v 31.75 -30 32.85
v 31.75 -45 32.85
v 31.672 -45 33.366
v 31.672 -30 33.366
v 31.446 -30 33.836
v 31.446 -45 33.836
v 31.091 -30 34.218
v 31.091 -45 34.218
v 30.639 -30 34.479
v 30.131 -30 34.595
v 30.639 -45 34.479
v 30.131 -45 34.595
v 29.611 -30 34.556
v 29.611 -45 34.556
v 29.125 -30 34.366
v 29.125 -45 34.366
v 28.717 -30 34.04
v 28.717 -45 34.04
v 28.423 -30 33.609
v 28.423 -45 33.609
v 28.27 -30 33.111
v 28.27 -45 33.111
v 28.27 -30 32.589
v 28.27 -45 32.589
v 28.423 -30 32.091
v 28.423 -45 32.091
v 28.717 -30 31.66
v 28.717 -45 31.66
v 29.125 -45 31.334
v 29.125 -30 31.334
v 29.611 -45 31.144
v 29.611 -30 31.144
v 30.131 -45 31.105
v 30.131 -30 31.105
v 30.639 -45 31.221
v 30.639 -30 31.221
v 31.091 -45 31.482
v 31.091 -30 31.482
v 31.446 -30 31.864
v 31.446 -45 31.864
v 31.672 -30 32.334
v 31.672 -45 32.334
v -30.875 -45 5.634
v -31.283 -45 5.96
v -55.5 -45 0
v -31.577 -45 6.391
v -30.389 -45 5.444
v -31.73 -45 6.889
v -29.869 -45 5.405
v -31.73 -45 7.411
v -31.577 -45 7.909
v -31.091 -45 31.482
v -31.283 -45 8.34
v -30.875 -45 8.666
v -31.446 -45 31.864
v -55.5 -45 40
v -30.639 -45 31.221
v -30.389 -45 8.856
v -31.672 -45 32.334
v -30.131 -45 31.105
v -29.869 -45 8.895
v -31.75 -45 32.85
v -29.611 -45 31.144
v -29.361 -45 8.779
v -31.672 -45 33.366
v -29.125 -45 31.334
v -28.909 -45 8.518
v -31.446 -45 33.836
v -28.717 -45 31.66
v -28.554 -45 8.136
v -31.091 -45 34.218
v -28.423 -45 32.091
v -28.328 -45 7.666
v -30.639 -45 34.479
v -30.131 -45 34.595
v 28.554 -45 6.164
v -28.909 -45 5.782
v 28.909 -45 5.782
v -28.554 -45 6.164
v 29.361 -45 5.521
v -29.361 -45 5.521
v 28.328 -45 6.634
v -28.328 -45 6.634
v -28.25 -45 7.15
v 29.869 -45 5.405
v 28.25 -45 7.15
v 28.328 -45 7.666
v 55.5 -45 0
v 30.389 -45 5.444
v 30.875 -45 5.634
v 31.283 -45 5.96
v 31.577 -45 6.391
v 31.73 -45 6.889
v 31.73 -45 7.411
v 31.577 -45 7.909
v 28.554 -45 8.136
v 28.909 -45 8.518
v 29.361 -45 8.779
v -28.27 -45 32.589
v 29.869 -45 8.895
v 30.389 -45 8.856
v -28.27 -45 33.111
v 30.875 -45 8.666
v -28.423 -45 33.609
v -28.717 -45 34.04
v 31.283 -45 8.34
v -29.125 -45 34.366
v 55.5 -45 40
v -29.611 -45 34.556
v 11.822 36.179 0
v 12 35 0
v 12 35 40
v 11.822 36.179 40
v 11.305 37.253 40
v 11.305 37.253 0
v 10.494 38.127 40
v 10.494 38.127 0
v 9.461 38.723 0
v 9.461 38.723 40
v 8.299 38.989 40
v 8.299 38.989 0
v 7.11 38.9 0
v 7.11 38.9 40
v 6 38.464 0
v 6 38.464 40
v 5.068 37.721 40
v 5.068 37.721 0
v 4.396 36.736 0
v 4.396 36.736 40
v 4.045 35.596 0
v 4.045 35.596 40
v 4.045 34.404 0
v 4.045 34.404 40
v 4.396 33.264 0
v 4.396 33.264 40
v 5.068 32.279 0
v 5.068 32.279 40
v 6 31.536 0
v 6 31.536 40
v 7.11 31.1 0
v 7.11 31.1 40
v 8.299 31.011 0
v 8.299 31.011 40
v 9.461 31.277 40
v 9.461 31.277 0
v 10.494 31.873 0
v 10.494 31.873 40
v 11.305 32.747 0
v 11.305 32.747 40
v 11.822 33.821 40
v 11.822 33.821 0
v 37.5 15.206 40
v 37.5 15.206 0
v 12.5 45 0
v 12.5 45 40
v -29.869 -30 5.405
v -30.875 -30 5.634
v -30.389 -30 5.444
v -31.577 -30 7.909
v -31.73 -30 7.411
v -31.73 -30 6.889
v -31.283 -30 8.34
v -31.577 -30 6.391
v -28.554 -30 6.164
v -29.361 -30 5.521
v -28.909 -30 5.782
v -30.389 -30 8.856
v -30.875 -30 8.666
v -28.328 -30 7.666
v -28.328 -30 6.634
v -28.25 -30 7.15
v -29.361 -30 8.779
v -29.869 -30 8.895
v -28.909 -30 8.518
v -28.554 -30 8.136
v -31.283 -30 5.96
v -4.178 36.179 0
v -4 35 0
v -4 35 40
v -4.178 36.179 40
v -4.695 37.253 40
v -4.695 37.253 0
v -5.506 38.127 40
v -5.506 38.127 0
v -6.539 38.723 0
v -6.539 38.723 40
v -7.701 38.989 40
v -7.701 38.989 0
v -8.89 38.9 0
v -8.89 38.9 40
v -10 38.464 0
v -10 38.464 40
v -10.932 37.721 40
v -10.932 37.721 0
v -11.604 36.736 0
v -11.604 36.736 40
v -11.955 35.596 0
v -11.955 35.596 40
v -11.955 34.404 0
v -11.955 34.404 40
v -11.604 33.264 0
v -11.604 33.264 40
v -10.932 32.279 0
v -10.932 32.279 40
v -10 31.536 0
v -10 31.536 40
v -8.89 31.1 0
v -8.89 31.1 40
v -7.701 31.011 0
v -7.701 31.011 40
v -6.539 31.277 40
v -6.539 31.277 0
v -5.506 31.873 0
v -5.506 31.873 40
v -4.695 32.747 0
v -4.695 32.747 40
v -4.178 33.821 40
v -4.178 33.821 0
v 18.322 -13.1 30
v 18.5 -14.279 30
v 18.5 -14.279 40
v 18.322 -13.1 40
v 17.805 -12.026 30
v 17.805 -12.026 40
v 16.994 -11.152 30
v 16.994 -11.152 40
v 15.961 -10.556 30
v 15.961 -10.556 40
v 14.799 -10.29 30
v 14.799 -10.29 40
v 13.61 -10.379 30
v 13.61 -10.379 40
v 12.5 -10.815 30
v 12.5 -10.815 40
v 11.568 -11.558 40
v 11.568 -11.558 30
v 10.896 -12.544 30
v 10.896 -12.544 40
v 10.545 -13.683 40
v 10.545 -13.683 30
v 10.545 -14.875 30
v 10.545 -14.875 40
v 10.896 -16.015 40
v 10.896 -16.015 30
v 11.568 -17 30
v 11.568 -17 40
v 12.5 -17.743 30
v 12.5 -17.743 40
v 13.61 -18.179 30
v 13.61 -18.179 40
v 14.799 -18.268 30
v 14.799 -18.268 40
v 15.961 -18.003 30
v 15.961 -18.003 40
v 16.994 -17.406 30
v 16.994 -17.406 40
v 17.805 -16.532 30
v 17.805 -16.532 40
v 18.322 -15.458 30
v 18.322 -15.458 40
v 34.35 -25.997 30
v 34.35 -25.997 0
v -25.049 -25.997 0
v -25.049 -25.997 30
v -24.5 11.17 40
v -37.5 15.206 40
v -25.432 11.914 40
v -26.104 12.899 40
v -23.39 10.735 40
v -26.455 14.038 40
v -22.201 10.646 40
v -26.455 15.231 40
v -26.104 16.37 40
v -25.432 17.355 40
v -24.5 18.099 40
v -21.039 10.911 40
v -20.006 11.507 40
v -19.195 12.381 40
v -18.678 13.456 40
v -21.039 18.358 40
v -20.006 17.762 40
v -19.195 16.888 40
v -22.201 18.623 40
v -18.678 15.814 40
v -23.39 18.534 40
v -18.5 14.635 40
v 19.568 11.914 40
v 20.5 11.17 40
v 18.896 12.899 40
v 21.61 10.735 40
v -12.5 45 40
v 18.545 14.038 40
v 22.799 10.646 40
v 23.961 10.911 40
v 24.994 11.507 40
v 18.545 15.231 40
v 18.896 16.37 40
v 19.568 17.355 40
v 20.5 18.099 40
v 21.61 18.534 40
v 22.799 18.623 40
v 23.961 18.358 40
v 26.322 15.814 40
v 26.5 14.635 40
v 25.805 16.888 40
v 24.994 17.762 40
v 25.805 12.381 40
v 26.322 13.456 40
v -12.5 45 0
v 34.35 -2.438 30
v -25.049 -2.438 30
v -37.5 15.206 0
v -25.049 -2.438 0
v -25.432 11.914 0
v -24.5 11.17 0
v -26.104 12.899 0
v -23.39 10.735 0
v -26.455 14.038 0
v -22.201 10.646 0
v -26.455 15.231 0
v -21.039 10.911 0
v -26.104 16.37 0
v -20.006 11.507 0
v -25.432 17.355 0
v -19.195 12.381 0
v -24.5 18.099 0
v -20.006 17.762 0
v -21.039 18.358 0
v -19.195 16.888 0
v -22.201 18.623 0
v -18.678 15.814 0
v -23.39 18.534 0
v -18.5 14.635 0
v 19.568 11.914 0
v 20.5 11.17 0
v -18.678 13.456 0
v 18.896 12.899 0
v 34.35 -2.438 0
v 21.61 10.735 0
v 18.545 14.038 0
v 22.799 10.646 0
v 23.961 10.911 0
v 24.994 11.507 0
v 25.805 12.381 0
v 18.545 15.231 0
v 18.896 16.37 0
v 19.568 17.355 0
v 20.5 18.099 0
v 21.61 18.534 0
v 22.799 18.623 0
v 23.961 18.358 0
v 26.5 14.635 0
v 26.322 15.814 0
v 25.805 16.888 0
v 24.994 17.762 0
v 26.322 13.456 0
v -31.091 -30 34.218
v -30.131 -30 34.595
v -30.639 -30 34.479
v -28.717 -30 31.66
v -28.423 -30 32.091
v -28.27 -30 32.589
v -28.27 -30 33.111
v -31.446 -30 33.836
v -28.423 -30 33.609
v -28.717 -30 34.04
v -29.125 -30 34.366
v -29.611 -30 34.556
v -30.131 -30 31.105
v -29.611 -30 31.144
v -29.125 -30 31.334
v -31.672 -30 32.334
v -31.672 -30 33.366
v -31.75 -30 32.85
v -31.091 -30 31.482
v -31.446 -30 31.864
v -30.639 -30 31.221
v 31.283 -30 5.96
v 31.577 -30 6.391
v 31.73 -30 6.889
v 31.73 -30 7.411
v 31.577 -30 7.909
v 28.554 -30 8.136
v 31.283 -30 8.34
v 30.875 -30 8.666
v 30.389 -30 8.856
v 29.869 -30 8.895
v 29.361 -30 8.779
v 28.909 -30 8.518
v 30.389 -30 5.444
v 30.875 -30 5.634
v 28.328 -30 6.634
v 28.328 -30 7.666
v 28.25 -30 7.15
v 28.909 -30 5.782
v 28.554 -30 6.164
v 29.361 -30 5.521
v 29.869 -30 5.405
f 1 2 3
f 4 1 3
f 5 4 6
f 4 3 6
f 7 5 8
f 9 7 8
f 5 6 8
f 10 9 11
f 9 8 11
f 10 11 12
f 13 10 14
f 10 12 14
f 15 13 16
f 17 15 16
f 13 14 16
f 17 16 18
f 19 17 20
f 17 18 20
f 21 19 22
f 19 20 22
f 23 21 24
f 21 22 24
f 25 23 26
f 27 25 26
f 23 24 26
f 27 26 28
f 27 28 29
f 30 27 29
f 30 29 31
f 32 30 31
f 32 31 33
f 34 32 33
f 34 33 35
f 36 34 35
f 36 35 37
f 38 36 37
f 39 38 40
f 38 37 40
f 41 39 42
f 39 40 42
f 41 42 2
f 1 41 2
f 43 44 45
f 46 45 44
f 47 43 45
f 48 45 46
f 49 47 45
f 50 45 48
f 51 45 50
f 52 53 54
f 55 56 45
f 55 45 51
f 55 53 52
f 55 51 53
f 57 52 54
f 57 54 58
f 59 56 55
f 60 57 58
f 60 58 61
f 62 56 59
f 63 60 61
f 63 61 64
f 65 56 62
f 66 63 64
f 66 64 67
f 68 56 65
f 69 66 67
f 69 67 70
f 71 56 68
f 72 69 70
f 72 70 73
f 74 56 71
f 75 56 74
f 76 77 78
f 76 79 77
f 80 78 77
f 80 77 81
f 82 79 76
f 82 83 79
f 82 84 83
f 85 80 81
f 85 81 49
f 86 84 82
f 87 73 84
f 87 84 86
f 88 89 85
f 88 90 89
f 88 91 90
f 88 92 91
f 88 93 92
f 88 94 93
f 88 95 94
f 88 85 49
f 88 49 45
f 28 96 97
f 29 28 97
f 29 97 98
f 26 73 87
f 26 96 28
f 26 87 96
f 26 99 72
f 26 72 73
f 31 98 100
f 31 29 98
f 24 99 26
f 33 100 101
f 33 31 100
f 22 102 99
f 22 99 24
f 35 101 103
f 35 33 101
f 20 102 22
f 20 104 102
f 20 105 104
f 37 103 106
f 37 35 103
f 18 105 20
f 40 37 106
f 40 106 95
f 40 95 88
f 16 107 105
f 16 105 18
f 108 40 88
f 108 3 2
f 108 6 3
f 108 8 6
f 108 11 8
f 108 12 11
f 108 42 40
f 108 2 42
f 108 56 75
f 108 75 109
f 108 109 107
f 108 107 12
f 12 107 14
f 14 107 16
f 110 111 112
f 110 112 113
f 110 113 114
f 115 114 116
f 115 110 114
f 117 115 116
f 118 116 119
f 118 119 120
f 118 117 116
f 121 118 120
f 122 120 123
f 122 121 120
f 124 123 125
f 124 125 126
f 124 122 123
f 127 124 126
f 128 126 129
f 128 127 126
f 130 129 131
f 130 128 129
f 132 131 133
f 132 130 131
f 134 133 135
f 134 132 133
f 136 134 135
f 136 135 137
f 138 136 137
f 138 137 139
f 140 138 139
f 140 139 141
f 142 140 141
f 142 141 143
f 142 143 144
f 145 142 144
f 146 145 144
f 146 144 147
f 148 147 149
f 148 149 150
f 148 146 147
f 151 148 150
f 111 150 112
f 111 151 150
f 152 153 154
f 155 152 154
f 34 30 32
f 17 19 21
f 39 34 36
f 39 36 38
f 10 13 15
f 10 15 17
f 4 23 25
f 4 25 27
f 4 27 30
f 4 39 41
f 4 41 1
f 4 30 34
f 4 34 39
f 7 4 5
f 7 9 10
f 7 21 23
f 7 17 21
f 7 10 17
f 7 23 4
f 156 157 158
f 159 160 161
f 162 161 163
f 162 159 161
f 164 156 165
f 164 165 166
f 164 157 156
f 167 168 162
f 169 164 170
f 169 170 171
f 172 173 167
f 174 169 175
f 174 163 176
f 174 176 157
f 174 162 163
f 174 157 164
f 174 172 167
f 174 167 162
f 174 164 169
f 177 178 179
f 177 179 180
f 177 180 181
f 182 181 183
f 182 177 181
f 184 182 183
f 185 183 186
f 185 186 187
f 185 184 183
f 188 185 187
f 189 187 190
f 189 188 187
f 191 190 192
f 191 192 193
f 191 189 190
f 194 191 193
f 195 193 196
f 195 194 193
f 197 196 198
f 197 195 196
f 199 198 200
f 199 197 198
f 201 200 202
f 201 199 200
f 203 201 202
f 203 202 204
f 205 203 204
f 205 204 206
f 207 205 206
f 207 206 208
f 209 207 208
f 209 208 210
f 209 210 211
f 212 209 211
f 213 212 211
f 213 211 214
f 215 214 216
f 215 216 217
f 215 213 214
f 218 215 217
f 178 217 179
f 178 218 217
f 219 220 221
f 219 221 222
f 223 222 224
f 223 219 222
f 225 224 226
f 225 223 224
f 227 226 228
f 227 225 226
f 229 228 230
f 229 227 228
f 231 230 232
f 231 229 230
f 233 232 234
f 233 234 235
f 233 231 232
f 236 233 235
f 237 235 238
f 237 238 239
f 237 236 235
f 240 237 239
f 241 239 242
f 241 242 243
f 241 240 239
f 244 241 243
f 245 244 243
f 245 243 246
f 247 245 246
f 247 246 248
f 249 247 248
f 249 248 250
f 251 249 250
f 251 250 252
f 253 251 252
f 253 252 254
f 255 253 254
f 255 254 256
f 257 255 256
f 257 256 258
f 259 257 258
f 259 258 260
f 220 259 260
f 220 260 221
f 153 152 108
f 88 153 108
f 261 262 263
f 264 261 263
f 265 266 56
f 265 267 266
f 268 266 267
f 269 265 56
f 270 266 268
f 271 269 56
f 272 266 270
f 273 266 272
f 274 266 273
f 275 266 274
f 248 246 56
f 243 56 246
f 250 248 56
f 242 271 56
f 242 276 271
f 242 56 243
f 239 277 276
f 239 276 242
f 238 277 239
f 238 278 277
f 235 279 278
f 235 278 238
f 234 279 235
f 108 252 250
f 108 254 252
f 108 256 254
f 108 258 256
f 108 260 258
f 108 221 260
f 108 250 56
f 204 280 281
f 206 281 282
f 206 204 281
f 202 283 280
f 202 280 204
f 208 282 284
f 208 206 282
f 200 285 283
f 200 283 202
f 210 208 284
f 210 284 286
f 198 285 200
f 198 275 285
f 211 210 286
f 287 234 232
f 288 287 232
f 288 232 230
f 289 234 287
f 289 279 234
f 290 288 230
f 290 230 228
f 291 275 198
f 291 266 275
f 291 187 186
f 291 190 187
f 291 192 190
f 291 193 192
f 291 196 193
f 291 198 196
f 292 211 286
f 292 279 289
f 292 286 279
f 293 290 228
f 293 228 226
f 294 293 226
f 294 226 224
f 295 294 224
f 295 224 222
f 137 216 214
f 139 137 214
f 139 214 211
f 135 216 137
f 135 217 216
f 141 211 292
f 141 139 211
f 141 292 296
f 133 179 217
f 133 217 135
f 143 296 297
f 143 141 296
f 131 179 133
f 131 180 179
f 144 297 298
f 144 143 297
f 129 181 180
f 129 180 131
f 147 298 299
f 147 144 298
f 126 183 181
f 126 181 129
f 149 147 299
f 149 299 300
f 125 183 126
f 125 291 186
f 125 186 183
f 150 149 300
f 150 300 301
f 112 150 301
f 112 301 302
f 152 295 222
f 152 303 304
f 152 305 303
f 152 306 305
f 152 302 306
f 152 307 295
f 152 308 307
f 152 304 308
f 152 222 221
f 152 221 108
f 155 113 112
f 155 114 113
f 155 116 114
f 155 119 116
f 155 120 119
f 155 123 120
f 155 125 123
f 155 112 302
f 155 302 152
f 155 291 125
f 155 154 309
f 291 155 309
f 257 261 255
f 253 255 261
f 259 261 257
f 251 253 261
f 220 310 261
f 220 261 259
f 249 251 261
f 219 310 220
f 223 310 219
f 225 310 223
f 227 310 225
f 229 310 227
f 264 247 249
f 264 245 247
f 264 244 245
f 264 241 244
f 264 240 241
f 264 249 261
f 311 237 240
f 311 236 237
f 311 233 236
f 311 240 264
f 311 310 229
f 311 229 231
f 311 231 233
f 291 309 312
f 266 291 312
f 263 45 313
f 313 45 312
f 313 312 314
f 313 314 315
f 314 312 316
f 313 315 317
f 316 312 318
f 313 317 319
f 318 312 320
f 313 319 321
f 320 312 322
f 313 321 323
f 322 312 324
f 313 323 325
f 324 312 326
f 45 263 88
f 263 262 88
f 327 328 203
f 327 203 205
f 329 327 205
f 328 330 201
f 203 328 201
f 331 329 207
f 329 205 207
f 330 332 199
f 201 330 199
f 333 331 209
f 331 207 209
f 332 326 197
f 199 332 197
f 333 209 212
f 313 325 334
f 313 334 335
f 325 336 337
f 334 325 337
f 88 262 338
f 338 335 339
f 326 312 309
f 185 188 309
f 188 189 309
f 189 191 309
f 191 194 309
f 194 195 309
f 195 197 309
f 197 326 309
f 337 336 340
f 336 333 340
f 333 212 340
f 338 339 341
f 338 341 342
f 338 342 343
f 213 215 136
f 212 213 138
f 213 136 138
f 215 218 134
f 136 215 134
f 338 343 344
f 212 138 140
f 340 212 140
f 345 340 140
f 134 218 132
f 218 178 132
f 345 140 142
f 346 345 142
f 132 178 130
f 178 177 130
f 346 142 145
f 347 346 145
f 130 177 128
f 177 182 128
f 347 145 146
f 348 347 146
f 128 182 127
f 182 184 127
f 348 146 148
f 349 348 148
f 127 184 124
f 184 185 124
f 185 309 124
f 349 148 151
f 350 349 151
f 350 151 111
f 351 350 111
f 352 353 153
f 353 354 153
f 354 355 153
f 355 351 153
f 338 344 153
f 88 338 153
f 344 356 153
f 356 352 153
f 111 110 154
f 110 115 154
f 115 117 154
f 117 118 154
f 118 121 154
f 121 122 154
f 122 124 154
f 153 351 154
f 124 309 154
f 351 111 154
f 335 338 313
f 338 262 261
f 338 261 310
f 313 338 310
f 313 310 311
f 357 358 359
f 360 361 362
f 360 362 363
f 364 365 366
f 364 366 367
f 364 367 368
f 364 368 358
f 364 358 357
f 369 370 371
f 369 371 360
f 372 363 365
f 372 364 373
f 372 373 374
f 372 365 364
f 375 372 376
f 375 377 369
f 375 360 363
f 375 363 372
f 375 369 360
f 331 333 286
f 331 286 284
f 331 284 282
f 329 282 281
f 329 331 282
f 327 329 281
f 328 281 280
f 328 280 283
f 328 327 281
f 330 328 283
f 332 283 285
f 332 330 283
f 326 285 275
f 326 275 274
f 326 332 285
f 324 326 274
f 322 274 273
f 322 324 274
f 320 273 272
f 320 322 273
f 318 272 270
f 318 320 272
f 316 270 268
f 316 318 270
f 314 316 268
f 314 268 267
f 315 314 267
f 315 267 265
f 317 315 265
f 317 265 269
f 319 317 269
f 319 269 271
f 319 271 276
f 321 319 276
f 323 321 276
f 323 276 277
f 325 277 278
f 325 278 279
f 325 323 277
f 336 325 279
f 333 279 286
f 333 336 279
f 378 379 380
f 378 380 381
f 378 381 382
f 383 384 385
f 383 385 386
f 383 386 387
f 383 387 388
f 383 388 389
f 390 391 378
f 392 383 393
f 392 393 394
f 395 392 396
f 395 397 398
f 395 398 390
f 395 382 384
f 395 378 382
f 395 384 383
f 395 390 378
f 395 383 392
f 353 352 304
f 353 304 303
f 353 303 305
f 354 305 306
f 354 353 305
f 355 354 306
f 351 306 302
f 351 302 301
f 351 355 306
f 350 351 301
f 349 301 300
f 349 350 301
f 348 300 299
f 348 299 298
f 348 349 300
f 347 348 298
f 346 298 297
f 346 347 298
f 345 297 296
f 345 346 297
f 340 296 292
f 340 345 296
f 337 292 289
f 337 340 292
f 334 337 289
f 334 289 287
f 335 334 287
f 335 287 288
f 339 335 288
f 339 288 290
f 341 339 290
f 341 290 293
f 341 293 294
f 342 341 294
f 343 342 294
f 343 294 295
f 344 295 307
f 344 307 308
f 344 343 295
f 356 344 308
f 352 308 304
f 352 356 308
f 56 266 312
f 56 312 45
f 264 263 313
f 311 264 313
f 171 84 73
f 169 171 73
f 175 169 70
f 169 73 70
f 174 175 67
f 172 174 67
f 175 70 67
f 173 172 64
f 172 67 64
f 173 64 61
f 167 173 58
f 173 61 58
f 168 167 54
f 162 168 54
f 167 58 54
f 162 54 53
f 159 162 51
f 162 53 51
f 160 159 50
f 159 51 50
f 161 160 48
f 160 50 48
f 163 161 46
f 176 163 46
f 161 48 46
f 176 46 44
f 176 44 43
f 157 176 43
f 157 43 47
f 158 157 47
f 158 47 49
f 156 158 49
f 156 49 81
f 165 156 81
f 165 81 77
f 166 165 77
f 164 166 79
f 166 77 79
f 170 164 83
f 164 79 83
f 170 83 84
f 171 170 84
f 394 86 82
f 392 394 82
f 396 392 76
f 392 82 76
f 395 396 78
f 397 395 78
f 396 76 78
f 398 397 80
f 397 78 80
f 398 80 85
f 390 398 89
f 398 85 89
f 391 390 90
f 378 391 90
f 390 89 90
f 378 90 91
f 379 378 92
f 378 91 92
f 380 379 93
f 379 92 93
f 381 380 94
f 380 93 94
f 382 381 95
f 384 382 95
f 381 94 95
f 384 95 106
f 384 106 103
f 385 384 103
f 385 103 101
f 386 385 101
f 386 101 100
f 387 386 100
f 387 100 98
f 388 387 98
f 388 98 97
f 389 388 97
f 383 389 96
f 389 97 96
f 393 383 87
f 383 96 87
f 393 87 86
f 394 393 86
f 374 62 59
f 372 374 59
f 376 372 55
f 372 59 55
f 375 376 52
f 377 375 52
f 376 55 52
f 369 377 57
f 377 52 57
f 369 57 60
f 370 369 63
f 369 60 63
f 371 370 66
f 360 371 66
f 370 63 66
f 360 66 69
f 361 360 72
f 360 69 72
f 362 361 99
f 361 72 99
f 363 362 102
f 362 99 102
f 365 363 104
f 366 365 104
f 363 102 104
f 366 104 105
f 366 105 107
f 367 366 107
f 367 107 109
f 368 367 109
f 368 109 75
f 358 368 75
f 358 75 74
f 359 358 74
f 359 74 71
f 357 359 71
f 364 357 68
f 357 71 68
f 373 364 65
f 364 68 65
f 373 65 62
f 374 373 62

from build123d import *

# Parameters (mm, degrees)
SKETCH4_R           = 4
BOSS_EXTRUDE1_DEPTH = 40
SKETCH5_R           = 1.75
CUT_EXTRUDE1_DEPTH  = 15
SKETCH6_W           = 59.399220689
SKETCH6_H           = 23.559499922
CUT_EXTRUDE3_DEPTH  = 30
BOSS_EXTRUDE2_DEPTH = 40


with BuildPart() as part:
    # Sketch4 → Boss-Extrude1 (new body)
    # profile 1 of 2: a face of its own
    with BuildSketch(Plane.XY):
        Polygon((0, -45), (37.5, -45), (37.5, 15.206160185), (12.5, 45), (0, 45), align=None)
        with Locations((14.5, -14.279076444)):
            Circle(SKETCH4_R, mode=Mode.SUBTRACT)
        with Locations((22.5, 14.634588146)):
            Circle(SKETCH4_R, mode=Mode.SUBTRACT)
        with Locations((8, 35)):
            Circle(SKETCH4_R, mode=Mode.SUBTRACT)
    # profile 2 of 2: a face of its own
    with BuildSketch(Plane.XY):
        Polygon((-37.5, -45), (0, -45), (0, 45), (-12.5, 45), (-37.5, 15.206160185), align=None)
        with Locations((-22.5, 14.634588146)):
            Circle(SKETCH4_R, mode=Mode.SUBTRACT)
        with Locations((-8, 35)):
            Circle(SKETCH4_R, mode=Mode.SUBTRACT)
    extrude(amount=BOSS_EXTRUDE1_DEPTH)

    # Sketch5 → Cut-Extrude1 (cut)
    with BuildSketch(Plane.XZ.offset(45)):
        with Locations((-30, 7.15)):
            Circle(SKETCH5_R)
        with Locations(Location((30, 7.15, 0), (0, 0, 180))):
            Circle(SKETCH5_R)
        with Locations((30, 32.85)):
            Circle(SKETCH5_R)
        with Locations(Location((-30, 32.85, 0), (0, 0, 180))):
            Circle(SKETCH5_R)
    extrude(amount=-CUT_EXTRUDE1_DEPTH, mode=Mode.SUBTRACT)

    # Sketch6 → Cut-Extrude3 (cut)
    with BuildSketch(Plane(origin=(0, 0, 0), x_dir=(-1, 0, 0), z_dir=(0, 0, -1))):
        with Locations((-4.650193569, -14.217324683)):
            Rectangle(SKETCH6_W, SKETCH6_H)
    extrude(amount=-CUT_EXTRUDE3_DEPTH, mode=Mode.SUBTRACT)

    # Sketch7 → Boss-Extrude2 (add)
    with BuildSketch(Plane.XY.offset(40)):
        Polygon((-37.5, 15.206160185), (-55.5, -45), (-37.5, -45), align=None)
        Polygon((37.5, -45), (37.5, 15.206160185), (55.5, -45), align=None)
    extrude(amount=-BOSS_EXTRUDE2_DEPTH)


solid = part.part
